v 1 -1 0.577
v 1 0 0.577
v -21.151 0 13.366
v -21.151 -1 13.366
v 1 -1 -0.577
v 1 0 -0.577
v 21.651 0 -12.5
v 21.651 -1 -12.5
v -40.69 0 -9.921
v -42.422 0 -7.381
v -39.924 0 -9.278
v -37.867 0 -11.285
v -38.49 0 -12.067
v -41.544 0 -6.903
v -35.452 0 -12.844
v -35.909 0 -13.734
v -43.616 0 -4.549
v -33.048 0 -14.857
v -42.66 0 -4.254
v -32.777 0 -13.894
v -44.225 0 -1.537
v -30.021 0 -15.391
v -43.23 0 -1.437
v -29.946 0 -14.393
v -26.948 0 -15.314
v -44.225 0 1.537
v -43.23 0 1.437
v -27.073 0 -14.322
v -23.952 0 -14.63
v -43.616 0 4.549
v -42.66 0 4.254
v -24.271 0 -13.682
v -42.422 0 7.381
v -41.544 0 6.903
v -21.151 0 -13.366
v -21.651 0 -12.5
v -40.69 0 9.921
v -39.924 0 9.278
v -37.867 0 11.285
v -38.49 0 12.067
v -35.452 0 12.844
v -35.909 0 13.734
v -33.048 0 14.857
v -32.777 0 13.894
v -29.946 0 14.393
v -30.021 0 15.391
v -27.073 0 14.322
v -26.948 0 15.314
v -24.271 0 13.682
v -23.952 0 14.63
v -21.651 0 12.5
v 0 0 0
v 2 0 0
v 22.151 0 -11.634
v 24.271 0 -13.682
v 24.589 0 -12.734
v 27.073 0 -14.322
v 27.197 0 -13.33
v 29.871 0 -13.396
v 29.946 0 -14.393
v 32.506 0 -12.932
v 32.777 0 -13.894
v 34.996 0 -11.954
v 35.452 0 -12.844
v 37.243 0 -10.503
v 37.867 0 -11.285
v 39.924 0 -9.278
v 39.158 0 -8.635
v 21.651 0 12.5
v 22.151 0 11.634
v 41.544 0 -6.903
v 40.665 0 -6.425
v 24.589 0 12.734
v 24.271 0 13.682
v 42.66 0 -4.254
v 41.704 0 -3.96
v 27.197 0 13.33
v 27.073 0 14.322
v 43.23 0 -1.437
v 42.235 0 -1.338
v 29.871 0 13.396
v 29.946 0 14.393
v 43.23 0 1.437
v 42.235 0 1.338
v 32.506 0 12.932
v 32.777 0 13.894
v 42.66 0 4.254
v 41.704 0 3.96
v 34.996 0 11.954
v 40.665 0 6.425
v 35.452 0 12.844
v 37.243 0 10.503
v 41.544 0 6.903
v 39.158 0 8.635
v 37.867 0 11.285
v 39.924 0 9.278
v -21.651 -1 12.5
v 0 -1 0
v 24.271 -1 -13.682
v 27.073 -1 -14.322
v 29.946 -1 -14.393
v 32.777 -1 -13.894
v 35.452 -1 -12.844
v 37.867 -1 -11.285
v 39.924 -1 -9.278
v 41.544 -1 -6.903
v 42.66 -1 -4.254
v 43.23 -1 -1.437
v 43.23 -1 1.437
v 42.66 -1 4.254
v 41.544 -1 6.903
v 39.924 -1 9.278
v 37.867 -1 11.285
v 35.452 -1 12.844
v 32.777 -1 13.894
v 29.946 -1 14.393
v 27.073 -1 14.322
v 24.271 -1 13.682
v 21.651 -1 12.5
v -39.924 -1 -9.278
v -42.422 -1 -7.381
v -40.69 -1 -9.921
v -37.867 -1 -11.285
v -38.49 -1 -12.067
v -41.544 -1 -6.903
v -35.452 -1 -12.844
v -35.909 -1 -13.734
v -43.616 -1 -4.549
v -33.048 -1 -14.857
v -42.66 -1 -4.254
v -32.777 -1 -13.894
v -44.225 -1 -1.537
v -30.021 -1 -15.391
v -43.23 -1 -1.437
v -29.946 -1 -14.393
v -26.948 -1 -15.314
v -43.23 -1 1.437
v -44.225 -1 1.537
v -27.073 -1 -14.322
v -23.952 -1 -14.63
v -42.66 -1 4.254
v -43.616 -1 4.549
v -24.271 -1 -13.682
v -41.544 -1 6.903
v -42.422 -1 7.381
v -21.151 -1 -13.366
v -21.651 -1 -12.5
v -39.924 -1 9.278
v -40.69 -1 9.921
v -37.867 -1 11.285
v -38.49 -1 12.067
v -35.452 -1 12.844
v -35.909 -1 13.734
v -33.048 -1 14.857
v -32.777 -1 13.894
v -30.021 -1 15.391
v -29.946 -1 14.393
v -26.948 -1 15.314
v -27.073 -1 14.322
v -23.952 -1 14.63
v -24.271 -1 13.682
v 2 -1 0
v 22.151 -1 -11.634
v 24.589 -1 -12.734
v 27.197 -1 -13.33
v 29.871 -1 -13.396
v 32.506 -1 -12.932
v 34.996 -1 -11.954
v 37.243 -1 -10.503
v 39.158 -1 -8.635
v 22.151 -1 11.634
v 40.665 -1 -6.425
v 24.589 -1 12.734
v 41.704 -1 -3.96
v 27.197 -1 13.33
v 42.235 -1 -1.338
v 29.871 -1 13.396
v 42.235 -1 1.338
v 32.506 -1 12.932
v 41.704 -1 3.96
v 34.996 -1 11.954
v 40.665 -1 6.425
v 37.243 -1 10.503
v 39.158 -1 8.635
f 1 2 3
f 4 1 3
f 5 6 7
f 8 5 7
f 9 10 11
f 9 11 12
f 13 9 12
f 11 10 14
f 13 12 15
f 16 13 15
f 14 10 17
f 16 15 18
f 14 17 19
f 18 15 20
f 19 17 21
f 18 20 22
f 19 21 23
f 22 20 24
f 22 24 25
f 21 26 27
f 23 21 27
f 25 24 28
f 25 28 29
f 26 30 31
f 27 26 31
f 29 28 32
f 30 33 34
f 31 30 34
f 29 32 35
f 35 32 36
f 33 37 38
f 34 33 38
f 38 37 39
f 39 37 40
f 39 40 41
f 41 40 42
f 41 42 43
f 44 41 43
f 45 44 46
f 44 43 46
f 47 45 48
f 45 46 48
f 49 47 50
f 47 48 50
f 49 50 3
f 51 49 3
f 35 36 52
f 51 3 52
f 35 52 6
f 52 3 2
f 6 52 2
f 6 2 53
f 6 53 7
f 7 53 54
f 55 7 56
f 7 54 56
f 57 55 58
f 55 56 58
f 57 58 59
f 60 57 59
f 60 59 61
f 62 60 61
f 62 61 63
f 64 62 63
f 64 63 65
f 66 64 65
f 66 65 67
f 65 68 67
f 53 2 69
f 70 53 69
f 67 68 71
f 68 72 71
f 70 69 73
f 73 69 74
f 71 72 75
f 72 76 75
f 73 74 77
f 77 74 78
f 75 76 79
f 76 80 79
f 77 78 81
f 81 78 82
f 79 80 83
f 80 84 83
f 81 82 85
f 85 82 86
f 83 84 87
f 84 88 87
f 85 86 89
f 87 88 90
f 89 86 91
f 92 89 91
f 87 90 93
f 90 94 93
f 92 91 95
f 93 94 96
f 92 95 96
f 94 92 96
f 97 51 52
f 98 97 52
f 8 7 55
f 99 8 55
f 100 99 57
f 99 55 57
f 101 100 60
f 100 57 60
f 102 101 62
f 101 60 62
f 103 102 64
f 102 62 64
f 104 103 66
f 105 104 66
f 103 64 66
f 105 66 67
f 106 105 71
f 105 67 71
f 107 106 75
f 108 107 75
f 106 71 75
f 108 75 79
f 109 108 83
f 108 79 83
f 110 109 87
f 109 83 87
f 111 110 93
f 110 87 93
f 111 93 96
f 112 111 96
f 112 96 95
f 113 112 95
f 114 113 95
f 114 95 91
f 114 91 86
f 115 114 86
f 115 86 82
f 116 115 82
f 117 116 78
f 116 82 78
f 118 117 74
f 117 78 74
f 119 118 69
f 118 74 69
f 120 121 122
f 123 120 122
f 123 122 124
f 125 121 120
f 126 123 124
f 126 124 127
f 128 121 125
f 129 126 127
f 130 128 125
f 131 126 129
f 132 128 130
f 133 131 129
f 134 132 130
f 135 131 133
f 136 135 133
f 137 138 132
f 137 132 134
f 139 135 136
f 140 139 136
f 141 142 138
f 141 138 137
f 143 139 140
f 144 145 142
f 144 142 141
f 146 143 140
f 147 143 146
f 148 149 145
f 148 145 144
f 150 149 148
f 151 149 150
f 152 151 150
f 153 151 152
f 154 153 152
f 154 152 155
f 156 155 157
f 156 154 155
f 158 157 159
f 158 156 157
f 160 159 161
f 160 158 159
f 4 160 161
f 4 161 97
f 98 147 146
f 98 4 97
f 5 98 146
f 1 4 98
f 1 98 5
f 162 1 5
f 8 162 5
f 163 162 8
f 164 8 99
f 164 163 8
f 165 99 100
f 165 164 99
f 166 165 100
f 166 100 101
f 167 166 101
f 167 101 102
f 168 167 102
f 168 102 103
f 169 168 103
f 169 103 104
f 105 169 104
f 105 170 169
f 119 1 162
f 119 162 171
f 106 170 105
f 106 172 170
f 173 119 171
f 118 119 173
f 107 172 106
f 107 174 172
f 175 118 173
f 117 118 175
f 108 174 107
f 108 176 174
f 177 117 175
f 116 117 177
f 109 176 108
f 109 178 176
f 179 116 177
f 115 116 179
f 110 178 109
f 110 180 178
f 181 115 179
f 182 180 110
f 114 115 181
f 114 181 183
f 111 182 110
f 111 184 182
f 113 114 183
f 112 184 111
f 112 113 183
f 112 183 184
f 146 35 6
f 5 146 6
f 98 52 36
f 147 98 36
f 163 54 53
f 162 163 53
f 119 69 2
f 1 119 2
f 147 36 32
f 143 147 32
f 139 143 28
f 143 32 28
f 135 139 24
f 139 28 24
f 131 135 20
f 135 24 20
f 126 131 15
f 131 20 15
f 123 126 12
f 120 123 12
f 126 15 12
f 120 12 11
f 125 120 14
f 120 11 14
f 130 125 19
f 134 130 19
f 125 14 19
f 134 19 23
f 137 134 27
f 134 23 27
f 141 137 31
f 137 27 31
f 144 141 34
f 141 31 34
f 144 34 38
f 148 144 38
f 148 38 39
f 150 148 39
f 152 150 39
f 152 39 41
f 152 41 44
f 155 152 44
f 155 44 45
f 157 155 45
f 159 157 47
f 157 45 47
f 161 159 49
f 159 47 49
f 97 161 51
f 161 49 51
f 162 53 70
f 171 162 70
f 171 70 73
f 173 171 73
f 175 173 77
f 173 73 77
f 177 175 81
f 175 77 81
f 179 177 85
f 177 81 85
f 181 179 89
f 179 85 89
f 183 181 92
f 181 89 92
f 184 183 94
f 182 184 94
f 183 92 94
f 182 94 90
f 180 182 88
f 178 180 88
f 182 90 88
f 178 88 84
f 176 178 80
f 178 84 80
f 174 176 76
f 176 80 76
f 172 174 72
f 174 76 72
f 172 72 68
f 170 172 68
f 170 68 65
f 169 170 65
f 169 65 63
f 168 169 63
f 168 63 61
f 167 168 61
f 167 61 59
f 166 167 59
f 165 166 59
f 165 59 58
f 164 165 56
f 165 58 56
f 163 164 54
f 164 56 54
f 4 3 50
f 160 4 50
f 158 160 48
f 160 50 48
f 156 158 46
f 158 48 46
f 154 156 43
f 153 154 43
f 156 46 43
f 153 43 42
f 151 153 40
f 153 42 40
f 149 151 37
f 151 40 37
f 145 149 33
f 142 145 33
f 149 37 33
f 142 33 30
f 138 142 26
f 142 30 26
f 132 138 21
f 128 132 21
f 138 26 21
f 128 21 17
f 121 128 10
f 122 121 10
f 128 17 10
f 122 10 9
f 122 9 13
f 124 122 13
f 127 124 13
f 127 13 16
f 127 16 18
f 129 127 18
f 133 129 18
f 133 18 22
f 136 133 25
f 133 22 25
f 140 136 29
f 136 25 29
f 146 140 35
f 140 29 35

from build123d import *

# Parameters (mm, degrees)
F1_DEPTH = 1


with BuildPart() as f1:
    # F0 (on Front) → F1 (new body)
    with BuildSketch(Plane.XZ):
        with BuildLine():
            Line((1, -0.5773502692), (0, 0))
            Line((0, 0), (1, 0.5773502692))
            Line((1, 0.5773502692), (-21.1506350946, 13.3660254038))
            ThreePointArc((-21.1506350946, 13.3660254038), (-44.3012701892, 0), (-21.1506350946, -13.3660254038))
            Line((-21.1506350946, -13.3660254038), (1, -0.5773502692))
        make_face()
        with BuildLine():
            Line((0, 0), (-21.6506350946, -12.5))
            ThreePointArc((-21.6506350946, -12.5), (-43.3012701892, 0), (-21.6506350946, 12.5))
            Line((-21.6506350946, 12.5), (0, 0))
        make_face(mode=Mode.SUBTRACT)
        Polygon((1, 0.5773502692), (0, 0), (1, -0.5773502692), (2, 0), align=None)
        with BuildLine():
            Line((21.6506350946, 12.5), (1, 0.5773502692))
            Line((1, 0.5773502692), (2, 0))
            Line((2, 0), (1, -0.5773502692))
            Line((1, -0.5773502692), (21.6506350946, -12.5))
            ThreePointArc((21.6506350946, -12.5), (43.3012701892, 0), (21.6506350946, 12.5))
        make_face()
        with BuildLine():
            Line((22.1506350946, -11.6339745962), (2, 0))
            Line((2, 0), (22.1506350946, 11.6339745962))
            ThreePointArc((22.1506350946, 11.6339745962), (42.3012701892, 0), (22.1506350946, -11.6339745962))
        make_face(mode=Mode.SUBTRACT)
    extrude(amount=F1_DEPTH)


solid = f1.part
